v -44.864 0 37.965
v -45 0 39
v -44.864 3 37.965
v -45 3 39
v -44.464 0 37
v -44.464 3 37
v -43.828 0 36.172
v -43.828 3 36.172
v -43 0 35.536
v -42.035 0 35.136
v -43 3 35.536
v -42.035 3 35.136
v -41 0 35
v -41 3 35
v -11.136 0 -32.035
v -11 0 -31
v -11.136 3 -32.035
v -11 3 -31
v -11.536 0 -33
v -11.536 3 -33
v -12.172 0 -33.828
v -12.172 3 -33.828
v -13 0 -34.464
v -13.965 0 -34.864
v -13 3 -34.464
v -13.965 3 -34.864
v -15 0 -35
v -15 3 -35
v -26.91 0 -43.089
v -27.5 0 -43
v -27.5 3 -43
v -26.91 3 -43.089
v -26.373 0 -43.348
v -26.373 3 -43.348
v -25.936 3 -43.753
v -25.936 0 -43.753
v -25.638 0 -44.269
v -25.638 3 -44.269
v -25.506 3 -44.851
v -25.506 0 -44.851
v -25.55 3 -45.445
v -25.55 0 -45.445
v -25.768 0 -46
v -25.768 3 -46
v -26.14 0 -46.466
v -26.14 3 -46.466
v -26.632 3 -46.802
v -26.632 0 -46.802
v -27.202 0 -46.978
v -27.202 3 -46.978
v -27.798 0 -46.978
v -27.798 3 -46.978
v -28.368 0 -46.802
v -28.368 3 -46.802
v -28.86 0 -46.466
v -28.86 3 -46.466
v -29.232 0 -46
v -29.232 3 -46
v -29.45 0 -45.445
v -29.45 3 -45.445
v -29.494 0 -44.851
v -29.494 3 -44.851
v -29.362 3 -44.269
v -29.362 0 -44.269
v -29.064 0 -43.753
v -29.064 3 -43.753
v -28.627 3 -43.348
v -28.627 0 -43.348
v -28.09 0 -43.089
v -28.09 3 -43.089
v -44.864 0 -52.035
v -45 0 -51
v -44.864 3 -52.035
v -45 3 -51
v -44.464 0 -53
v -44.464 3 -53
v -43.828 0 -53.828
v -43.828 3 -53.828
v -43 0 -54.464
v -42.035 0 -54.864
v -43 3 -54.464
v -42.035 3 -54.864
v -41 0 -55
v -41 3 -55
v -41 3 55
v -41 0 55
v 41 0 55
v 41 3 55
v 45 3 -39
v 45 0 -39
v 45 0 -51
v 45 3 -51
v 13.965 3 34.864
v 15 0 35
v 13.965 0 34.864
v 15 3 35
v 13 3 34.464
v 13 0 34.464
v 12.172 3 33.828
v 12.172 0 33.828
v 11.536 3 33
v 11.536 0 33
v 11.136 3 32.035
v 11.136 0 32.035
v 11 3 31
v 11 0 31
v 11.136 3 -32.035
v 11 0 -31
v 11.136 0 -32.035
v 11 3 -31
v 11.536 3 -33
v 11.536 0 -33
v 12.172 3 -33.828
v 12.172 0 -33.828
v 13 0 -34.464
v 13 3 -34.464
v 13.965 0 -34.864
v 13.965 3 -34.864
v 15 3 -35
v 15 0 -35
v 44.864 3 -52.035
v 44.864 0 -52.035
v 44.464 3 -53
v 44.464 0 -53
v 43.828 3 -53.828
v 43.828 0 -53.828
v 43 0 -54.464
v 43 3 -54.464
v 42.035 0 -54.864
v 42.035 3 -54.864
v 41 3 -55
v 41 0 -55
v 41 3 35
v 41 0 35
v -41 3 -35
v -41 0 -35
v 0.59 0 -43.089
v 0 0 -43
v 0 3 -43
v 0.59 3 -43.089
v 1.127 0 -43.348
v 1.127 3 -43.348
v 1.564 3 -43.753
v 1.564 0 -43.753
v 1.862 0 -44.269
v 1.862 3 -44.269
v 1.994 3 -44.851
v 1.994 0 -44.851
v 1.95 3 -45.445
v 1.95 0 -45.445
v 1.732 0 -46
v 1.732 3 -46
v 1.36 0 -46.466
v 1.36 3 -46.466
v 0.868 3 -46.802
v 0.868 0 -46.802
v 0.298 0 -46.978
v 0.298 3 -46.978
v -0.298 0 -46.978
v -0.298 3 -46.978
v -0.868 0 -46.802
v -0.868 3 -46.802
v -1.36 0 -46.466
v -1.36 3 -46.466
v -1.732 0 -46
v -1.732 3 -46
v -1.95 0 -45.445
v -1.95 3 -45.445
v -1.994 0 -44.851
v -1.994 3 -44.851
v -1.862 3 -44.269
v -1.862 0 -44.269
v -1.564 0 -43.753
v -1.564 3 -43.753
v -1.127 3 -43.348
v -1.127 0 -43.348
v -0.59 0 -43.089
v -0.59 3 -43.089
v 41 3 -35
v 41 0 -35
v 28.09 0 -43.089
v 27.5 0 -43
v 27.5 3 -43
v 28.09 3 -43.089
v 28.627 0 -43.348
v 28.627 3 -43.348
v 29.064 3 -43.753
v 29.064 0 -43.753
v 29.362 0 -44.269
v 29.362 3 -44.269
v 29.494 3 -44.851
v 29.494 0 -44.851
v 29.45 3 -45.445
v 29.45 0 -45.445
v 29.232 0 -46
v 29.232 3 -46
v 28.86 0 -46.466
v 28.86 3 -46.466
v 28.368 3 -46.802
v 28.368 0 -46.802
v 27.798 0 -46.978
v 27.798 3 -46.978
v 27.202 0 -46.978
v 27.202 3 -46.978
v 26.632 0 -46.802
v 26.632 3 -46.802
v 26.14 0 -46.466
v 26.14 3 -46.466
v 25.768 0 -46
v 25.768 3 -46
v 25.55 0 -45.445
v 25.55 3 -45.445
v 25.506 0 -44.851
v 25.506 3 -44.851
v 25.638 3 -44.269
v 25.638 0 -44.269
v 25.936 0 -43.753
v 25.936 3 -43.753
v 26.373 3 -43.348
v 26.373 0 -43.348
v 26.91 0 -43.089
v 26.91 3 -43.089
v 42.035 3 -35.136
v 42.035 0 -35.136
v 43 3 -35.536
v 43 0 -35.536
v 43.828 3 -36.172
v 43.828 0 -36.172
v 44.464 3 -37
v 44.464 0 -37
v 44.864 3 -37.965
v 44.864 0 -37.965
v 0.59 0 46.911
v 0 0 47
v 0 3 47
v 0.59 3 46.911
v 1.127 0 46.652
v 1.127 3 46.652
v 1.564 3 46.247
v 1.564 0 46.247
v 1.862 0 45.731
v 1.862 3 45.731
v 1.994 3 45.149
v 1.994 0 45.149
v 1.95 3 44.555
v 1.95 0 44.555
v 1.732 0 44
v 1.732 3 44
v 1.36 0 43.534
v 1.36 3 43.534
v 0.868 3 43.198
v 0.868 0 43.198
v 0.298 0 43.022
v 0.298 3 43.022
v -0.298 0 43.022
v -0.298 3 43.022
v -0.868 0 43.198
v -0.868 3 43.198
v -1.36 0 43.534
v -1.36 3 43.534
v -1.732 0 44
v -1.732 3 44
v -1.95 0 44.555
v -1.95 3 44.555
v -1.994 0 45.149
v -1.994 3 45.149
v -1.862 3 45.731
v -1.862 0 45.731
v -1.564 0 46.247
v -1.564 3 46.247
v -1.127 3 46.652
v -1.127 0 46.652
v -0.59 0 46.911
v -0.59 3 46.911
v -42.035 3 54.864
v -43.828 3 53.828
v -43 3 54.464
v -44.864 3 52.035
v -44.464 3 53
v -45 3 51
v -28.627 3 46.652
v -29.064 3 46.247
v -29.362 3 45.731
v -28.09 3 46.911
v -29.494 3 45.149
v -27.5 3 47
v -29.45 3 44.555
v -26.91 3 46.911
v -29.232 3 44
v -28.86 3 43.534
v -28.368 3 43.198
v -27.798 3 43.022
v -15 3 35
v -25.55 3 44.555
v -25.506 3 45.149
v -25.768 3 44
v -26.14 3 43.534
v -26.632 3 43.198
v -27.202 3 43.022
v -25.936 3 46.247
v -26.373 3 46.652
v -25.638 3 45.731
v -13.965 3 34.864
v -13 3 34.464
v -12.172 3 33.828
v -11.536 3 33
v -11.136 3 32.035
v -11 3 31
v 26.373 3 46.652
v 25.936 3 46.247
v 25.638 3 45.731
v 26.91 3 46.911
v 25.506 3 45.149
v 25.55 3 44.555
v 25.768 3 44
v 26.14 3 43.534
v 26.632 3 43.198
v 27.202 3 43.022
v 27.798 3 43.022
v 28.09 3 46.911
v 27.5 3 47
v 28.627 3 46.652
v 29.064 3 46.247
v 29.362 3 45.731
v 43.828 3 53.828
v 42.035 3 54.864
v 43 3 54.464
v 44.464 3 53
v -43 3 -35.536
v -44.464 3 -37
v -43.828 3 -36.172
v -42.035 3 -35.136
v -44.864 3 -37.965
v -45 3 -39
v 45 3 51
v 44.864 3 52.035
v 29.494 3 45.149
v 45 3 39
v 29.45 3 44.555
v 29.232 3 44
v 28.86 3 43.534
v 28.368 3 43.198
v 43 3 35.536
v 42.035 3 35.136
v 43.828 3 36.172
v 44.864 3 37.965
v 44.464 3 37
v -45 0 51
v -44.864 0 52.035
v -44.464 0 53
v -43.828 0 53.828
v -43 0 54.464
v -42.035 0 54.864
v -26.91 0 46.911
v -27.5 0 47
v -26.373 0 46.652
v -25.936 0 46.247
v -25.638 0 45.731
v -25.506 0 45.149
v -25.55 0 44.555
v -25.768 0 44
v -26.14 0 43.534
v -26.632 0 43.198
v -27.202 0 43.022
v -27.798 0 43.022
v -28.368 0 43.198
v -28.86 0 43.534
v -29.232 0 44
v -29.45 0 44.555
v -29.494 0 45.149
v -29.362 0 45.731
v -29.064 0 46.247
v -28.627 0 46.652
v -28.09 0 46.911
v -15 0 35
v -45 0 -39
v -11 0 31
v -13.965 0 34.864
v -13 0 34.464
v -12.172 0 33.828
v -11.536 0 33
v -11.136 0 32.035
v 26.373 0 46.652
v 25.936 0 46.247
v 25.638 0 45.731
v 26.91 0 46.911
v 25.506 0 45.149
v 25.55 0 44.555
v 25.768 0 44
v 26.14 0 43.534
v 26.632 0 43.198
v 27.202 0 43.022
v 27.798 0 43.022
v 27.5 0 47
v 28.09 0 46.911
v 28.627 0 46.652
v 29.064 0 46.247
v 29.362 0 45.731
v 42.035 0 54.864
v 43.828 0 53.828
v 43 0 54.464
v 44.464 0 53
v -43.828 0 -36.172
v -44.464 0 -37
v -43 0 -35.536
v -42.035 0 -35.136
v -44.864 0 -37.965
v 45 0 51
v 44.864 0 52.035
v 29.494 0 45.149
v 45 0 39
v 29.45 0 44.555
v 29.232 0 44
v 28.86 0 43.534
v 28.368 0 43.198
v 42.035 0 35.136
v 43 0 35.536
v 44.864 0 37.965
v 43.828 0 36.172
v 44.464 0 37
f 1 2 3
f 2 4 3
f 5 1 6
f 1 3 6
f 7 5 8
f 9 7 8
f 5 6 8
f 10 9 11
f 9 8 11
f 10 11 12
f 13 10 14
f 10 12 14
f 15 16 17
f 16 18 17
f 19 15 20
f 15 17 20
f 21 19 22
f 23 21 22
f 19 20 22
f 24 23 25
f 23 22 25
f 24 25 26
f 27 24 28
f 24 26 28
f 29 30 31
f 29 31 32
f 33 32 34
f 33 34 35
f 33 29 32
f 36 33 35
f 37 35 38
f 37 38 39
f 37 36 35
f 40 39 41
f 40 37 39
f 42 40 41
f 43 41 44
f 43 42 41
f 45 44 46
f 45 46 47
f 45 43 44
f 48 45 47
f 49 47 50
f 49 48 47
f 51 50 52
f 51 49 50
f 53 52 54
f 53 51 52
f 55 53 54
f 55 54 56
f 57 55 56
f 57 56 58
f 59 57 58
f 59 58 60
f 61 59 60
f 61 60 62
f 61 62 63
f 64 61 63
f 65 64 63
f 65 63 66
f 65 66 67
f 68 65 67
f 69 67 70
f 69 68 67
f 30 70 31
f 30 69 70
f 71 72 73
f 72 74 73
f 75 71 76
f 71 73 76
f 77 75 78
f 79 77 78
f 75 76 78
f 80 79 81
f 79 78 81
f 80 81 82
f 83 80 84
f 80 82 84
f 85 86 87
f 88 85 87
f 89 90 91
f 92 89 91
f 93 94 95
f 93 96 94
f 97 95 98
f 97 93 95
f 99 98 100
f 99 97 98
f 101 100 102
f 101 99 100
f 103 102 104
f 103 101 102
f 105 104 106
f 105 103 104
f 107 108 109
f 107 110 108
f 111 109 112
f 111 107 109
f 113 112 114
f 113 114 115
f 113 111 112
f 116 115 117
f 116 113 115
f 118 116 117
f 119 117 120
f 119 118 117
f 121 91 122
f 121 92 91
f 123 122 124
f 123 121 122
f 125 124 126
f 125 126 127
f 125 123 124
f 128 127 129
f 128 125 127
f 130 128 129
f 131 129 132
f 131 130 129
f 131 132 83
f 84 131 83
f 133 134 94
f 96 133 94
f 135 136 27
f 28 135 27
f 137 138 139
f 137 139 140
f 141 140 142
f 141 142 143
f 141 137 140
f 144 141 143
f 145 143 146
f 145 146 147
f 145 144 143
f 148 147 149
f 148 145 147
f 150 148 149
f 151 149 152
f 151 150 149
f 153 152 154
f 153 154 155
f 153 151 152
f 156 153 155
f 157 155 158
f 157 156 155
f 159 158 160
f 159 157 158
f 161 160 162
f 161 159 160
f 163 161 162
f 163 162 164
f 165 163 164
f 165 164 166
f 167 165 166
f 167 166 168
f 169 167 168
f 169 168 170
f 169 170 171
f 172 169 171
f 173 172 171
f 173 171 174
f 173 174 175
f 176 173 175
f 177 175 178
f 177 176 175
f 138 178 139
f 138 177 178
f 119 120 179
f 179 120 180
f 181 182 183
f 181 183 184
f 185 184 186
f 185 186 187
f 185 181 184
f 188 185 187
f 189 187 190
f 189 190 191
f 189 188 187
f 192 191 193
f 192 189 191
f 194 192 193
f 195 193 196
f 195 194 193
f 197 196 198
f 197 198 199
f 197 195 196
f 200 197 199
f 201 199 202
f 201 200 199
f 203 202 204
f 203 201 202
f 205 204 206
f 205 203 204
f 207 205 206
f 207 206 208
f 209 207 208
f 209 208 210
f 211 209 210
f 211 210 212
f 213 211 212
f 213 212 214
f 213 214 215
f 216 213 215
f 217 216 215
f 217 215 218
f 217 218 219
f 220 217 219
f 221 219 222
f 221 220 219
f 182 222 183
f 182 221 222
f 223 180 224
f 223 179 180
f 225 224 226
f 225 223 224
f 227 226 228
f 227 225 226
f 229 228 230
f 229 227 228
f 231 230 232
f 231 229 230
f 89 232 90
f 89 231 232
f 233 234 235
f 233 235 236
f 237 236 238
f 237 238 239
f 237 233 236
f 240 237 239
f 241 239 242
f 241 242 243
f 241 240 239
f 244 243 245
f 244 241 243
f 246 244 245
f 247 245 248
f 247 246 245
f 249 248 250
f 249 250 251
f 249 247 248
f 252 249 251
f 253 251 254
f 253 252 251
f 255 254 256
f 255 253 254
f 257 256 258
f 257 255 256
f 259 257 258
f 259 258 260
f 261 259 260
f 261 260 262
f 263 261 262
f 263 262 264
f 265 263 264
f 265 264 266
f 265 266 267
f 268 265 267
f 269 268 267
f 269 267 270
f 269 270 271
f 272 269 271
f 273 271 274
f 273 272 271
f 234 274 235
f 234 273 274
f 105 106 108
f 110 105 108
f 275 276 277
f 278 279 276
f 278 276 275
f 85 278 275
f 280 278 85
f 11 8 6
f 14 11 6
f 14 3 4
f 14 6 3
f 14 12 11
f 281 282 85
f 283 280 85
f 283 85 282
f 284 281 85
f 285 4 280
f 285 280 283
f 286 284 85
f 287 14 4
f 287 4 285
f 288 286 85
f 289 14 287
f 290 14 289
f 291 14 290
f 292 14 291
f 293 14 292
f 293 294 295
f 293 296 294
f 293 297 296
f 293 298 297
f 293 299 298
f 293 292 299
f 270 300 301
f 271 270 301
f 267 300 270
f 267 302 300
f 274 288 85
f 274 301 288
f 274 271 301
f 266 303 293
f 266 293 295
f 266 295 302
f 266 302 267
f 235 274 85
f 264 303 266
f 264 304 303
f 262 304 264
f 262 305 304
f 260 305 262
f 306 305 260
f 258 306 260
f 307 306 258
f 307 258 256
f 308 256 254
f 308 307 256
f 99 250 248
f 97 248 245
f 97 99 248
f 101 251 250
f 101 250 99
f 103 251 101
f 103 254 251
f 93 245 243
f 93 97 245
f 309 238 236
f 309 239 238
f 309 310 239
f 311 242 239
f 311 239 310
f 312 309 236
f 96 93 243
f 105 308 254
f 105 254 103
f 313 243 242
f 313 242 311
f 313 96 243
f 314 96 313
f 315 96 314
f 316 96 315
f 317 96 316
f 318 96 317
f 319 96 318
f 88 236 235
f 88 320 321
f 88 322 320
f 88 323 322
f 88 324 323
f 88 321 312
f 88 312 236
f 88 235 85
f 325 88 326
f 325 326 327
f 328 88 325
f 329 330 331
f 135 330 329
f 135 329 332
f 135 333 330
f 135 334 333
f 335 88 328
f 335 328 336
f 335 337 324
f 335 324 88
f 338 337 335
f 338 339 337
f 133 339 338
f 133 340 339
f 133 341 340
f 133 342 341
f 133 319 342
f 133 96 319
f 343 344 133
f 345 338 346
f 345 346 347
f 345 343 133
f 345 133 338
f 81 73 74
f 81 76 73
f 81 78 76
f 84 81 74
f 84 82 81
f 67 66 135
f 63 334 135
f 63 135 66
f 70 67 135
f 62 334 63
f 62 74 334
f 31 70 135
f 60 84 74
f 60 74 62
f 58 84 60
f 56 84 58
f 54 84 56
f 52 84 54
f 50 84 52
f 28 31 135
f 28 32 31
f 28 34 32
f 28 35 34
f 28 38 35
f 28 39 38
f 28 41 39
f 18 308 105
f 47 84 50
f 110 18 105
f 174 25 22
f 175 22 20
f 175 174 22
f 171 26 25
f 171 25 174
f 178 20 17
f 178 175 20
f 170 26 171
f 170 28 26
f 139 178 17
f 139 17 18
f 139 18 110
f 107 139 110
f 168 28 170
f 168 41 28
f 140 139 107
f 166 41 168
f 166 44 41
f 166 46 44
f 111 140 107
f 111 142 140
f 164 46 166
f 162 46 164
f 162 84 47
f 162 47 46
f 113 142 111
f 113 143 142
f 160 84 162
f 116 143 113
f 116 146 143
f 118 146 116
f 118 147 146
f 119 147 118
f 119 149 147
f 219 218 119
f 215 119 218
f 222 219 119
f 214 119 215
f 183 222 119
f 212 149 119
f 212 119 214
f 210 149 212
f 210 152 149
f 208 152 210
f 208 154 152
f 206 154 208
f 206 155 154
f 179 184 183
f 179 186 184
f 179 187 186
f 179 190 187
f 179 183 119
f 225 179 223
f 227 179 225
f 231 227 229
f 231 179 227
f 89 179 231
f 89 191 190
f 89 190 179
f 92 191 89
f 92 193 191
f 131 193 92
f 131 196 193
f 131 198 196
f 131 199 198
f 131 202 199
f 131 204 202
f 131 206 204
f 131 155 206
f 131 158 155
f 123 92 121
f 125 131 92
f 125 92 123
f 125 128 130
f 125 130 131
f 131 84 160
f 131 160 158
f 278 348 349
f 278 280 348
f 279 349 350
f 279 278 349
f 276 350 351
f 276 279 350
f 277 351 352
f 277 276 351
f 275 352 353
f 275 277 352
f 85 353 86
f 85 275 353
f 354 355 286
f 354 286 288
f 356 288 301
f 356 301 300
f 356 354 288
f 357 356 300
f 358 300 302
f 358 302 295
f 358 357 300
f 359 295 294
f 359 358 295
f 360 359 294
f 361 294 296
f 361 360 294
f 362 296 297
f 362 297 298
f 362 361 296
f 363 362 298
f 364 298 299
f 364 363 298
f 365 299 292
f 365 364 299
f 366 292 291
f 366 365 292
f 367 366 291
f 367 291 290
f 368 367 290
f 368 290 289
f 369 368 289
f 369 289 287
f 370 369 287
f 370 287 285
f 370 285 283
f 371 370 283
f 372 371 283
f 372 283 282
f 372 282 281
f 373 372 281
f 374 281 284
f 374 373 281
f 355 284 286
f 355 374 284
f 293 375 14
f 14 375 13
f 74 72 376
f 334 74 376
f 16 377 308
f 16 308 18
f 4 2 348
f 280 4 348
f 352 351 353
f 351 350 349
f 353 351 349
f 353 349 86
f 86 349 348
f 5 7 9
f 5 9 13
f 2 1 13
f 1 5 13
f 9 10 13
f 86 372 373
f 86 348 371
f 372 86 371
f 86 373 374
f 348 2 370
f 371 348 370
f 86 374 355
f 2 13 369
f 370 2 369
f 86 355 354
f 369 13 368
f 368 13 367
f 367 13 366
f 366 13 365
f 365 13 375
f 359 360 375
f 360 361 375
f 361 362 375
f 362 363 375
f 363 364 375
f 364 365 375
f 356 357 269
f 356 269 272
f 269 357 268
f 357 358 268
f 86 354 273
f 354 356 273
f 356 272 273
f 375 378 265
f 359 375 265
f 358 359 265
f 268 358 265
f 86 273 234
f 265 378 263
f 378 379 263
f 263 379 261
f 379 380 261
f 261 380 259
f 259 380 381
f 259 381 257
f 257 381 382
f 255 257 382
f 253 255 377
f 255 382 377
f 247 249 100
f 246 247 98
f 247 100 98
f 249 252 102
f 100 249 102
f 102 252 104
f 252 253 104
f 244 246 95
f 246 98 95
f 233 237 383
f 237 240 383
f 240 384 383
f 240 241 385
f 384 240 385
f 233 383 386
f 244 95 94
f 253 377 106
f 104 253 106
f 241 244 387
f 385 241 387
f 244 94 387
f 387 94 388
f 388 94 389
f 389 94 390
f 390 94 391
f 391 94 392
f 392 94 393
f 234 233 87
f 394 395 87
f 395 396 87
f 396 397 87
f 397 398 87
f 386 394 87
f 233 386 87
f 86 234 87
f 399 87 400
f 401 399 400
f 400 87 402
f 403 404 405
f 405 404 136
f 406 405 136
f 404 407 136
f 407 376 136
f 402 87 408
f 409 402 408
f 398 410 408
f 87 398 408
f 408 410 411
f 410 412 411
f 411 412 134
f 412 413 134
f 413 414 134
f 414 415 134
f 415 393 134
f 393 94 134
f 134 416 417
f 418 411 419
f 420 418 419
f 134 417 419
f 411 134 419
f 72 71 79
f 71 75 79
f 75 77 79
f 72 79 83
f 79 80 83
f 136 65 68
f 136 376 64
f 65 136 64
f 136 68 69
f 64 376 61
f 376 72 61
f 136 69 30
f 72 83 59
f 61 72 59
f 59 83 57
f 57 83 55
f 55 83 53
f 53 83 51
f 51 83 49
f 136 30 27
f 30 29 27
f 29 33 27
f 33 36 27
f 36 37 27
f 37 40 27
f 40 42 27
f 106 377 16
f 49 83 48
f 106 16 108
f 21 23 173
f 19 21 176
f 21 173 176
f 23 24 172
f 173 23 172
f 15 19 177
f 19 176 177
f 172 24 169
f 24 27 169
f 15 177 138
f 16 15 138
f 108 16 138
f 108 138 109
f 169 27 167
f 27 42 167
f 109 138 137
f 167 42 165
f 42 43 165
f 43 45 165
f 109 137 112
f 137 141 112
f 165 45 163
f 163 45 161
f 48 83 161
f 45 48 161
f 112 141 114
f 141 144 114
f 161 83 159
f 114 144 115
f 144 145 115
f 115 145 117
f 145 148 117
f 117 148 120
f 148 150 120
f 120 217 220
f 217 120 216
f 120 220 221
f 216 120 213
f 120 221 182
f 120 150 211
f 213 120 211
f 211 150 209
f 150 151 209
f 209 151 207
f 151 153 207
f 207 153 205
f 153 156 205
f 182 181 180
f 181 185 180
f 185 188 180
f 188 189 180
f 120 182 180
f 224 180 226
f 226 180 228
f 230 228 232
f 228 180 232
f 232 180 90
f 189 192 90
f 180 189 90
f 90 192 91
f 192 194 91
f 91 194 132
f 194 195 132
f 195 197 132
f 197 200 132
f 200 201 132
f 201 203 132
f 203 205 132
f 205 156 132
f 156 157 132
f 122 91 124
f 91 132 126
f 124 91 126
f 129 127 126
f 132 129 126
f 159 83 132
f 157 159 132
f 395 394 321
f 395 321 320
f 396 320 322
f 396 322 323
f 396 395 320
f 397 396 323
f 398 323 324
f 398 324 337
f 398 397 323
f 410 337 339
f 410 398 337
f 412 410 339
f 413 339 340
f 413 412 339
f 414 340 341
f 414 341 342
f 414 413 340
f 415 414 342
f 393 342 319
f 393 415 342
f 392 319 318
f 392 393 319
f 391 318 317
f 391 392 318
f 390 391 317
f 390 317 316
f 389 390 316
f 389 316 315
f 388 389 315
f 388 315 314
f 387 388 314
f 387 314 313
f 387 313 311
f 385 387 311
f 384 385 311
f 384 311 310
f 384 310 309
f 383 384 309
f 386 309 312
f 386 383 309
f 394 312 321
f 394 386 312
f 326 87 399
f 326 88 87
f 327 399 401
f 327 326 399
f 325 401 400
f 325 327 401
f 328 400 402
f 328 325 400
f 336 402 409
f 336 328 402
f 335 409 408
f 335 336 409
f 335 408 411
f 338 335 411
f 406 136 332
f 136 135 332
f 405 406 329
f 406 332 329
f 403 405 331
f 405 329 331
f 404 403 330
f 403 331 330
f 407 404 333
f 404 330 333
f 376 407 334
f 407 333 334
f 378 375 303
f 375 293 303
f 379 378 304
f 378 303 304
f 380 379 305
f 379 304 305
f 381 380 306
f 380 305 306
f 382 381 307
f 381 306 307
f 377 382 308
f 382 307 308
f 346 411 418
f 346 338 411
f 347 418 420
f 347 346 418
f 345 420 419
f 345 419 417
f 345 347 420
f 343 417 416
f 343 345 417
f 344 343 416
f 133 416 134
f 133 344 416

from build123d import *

# Parameters (mm, degrees)
SKETCH_1_W      = 22
SKETCH_1_H      = 70
SKETCH_1_R      = 2
EXTRUDE_1_DEPTH = 3
FILLET_1_R      = 4


with BuildPart() as part:
    # 草图1 → 凸台-拉伸1 (new body)
    # profile 1 of 3: a face of its own
    with BuildSketch(Plane(origin=(0, 0, 0), x_dir=(1, 0, 0), z_dir=(0, 1, 0))):
        Rectangle(SKETCH_1_W, SKETCH_1_H)
    # profile 2 of 3: a face of its own
    with BuildSketch(Plane(origin=(0, 0, 0), x_dir=(1, 0, 0), z_dir=(0, 1, 0))):
        Polygon((-45, 35), (-11, 35), (11, 35), (45, 35), (45, 55), (-45, 55), align=None)
        with Locations(Location((-27.5, 45, 0), (0, 0, 270))):
            Circle(SKETCH_1_R, mode=Mode.SUBTRACT)
        with Locations(Location((0, 45, 0), (0, 0, 270))):
            Circle(SKETCH_1_R, mode=Mode.SUBTRACT)
        with Locations(Location((27.5, 45, 0), (0, 0, 270))):
            Circle(SKETCH_1_R, mode=Mode.SUBTRACT)
    # profile 3 of 3: a face of its own
    with BuildSketch(Plane(origin=(0, 0, 0), x_dir=(1, 0, 0), z_dir=(0, 1, 0))):
        Polygon((11, -35), (-11, -35), (-45, -35), (-45, -55), (45, -55), (45, -35), align=None)
        with Locations(Location((-27.5, -45, 0), (0, 0, 270))):
            Circle(SKETCH_1_R, mode=Mode.SUBTRACT)
        with Locations(Location((0, -45, 0), (0, 0, 270))):
            Circle(SKETCH_1_R, mode=Mode.SUBTRACT)
        with Locations(Location((27.5, -45, 0), (0, 0, 270))):
            Circle(SKETCH_1_R, mode=Mode.SUBTRACT)
    extrude(amount=EXTRUDE_1_DEPTH)

    # 圆角1
    fillet_1_edges = [part.edges().sort_by_distance(p)[0] for p in [
        (11, 1.5, 35),
        (45, 1.5, 35),
        (45, 1.5, 55),
        (-45, 1.5, 55),
        (-45, 1.5, 35),
        (-11, 1.5, 35),
        (-11, 1.5, -35),
        (-45, 1.5, -35),
        (-45, 1.5, -55),
        (45, 1.5, -55),
        (45, 1.5, -35),
        (11, 1.5, -35),
    ]]
    fillet(fillet_1_edges, radius=FILLET_1_R)


solid = part.part
